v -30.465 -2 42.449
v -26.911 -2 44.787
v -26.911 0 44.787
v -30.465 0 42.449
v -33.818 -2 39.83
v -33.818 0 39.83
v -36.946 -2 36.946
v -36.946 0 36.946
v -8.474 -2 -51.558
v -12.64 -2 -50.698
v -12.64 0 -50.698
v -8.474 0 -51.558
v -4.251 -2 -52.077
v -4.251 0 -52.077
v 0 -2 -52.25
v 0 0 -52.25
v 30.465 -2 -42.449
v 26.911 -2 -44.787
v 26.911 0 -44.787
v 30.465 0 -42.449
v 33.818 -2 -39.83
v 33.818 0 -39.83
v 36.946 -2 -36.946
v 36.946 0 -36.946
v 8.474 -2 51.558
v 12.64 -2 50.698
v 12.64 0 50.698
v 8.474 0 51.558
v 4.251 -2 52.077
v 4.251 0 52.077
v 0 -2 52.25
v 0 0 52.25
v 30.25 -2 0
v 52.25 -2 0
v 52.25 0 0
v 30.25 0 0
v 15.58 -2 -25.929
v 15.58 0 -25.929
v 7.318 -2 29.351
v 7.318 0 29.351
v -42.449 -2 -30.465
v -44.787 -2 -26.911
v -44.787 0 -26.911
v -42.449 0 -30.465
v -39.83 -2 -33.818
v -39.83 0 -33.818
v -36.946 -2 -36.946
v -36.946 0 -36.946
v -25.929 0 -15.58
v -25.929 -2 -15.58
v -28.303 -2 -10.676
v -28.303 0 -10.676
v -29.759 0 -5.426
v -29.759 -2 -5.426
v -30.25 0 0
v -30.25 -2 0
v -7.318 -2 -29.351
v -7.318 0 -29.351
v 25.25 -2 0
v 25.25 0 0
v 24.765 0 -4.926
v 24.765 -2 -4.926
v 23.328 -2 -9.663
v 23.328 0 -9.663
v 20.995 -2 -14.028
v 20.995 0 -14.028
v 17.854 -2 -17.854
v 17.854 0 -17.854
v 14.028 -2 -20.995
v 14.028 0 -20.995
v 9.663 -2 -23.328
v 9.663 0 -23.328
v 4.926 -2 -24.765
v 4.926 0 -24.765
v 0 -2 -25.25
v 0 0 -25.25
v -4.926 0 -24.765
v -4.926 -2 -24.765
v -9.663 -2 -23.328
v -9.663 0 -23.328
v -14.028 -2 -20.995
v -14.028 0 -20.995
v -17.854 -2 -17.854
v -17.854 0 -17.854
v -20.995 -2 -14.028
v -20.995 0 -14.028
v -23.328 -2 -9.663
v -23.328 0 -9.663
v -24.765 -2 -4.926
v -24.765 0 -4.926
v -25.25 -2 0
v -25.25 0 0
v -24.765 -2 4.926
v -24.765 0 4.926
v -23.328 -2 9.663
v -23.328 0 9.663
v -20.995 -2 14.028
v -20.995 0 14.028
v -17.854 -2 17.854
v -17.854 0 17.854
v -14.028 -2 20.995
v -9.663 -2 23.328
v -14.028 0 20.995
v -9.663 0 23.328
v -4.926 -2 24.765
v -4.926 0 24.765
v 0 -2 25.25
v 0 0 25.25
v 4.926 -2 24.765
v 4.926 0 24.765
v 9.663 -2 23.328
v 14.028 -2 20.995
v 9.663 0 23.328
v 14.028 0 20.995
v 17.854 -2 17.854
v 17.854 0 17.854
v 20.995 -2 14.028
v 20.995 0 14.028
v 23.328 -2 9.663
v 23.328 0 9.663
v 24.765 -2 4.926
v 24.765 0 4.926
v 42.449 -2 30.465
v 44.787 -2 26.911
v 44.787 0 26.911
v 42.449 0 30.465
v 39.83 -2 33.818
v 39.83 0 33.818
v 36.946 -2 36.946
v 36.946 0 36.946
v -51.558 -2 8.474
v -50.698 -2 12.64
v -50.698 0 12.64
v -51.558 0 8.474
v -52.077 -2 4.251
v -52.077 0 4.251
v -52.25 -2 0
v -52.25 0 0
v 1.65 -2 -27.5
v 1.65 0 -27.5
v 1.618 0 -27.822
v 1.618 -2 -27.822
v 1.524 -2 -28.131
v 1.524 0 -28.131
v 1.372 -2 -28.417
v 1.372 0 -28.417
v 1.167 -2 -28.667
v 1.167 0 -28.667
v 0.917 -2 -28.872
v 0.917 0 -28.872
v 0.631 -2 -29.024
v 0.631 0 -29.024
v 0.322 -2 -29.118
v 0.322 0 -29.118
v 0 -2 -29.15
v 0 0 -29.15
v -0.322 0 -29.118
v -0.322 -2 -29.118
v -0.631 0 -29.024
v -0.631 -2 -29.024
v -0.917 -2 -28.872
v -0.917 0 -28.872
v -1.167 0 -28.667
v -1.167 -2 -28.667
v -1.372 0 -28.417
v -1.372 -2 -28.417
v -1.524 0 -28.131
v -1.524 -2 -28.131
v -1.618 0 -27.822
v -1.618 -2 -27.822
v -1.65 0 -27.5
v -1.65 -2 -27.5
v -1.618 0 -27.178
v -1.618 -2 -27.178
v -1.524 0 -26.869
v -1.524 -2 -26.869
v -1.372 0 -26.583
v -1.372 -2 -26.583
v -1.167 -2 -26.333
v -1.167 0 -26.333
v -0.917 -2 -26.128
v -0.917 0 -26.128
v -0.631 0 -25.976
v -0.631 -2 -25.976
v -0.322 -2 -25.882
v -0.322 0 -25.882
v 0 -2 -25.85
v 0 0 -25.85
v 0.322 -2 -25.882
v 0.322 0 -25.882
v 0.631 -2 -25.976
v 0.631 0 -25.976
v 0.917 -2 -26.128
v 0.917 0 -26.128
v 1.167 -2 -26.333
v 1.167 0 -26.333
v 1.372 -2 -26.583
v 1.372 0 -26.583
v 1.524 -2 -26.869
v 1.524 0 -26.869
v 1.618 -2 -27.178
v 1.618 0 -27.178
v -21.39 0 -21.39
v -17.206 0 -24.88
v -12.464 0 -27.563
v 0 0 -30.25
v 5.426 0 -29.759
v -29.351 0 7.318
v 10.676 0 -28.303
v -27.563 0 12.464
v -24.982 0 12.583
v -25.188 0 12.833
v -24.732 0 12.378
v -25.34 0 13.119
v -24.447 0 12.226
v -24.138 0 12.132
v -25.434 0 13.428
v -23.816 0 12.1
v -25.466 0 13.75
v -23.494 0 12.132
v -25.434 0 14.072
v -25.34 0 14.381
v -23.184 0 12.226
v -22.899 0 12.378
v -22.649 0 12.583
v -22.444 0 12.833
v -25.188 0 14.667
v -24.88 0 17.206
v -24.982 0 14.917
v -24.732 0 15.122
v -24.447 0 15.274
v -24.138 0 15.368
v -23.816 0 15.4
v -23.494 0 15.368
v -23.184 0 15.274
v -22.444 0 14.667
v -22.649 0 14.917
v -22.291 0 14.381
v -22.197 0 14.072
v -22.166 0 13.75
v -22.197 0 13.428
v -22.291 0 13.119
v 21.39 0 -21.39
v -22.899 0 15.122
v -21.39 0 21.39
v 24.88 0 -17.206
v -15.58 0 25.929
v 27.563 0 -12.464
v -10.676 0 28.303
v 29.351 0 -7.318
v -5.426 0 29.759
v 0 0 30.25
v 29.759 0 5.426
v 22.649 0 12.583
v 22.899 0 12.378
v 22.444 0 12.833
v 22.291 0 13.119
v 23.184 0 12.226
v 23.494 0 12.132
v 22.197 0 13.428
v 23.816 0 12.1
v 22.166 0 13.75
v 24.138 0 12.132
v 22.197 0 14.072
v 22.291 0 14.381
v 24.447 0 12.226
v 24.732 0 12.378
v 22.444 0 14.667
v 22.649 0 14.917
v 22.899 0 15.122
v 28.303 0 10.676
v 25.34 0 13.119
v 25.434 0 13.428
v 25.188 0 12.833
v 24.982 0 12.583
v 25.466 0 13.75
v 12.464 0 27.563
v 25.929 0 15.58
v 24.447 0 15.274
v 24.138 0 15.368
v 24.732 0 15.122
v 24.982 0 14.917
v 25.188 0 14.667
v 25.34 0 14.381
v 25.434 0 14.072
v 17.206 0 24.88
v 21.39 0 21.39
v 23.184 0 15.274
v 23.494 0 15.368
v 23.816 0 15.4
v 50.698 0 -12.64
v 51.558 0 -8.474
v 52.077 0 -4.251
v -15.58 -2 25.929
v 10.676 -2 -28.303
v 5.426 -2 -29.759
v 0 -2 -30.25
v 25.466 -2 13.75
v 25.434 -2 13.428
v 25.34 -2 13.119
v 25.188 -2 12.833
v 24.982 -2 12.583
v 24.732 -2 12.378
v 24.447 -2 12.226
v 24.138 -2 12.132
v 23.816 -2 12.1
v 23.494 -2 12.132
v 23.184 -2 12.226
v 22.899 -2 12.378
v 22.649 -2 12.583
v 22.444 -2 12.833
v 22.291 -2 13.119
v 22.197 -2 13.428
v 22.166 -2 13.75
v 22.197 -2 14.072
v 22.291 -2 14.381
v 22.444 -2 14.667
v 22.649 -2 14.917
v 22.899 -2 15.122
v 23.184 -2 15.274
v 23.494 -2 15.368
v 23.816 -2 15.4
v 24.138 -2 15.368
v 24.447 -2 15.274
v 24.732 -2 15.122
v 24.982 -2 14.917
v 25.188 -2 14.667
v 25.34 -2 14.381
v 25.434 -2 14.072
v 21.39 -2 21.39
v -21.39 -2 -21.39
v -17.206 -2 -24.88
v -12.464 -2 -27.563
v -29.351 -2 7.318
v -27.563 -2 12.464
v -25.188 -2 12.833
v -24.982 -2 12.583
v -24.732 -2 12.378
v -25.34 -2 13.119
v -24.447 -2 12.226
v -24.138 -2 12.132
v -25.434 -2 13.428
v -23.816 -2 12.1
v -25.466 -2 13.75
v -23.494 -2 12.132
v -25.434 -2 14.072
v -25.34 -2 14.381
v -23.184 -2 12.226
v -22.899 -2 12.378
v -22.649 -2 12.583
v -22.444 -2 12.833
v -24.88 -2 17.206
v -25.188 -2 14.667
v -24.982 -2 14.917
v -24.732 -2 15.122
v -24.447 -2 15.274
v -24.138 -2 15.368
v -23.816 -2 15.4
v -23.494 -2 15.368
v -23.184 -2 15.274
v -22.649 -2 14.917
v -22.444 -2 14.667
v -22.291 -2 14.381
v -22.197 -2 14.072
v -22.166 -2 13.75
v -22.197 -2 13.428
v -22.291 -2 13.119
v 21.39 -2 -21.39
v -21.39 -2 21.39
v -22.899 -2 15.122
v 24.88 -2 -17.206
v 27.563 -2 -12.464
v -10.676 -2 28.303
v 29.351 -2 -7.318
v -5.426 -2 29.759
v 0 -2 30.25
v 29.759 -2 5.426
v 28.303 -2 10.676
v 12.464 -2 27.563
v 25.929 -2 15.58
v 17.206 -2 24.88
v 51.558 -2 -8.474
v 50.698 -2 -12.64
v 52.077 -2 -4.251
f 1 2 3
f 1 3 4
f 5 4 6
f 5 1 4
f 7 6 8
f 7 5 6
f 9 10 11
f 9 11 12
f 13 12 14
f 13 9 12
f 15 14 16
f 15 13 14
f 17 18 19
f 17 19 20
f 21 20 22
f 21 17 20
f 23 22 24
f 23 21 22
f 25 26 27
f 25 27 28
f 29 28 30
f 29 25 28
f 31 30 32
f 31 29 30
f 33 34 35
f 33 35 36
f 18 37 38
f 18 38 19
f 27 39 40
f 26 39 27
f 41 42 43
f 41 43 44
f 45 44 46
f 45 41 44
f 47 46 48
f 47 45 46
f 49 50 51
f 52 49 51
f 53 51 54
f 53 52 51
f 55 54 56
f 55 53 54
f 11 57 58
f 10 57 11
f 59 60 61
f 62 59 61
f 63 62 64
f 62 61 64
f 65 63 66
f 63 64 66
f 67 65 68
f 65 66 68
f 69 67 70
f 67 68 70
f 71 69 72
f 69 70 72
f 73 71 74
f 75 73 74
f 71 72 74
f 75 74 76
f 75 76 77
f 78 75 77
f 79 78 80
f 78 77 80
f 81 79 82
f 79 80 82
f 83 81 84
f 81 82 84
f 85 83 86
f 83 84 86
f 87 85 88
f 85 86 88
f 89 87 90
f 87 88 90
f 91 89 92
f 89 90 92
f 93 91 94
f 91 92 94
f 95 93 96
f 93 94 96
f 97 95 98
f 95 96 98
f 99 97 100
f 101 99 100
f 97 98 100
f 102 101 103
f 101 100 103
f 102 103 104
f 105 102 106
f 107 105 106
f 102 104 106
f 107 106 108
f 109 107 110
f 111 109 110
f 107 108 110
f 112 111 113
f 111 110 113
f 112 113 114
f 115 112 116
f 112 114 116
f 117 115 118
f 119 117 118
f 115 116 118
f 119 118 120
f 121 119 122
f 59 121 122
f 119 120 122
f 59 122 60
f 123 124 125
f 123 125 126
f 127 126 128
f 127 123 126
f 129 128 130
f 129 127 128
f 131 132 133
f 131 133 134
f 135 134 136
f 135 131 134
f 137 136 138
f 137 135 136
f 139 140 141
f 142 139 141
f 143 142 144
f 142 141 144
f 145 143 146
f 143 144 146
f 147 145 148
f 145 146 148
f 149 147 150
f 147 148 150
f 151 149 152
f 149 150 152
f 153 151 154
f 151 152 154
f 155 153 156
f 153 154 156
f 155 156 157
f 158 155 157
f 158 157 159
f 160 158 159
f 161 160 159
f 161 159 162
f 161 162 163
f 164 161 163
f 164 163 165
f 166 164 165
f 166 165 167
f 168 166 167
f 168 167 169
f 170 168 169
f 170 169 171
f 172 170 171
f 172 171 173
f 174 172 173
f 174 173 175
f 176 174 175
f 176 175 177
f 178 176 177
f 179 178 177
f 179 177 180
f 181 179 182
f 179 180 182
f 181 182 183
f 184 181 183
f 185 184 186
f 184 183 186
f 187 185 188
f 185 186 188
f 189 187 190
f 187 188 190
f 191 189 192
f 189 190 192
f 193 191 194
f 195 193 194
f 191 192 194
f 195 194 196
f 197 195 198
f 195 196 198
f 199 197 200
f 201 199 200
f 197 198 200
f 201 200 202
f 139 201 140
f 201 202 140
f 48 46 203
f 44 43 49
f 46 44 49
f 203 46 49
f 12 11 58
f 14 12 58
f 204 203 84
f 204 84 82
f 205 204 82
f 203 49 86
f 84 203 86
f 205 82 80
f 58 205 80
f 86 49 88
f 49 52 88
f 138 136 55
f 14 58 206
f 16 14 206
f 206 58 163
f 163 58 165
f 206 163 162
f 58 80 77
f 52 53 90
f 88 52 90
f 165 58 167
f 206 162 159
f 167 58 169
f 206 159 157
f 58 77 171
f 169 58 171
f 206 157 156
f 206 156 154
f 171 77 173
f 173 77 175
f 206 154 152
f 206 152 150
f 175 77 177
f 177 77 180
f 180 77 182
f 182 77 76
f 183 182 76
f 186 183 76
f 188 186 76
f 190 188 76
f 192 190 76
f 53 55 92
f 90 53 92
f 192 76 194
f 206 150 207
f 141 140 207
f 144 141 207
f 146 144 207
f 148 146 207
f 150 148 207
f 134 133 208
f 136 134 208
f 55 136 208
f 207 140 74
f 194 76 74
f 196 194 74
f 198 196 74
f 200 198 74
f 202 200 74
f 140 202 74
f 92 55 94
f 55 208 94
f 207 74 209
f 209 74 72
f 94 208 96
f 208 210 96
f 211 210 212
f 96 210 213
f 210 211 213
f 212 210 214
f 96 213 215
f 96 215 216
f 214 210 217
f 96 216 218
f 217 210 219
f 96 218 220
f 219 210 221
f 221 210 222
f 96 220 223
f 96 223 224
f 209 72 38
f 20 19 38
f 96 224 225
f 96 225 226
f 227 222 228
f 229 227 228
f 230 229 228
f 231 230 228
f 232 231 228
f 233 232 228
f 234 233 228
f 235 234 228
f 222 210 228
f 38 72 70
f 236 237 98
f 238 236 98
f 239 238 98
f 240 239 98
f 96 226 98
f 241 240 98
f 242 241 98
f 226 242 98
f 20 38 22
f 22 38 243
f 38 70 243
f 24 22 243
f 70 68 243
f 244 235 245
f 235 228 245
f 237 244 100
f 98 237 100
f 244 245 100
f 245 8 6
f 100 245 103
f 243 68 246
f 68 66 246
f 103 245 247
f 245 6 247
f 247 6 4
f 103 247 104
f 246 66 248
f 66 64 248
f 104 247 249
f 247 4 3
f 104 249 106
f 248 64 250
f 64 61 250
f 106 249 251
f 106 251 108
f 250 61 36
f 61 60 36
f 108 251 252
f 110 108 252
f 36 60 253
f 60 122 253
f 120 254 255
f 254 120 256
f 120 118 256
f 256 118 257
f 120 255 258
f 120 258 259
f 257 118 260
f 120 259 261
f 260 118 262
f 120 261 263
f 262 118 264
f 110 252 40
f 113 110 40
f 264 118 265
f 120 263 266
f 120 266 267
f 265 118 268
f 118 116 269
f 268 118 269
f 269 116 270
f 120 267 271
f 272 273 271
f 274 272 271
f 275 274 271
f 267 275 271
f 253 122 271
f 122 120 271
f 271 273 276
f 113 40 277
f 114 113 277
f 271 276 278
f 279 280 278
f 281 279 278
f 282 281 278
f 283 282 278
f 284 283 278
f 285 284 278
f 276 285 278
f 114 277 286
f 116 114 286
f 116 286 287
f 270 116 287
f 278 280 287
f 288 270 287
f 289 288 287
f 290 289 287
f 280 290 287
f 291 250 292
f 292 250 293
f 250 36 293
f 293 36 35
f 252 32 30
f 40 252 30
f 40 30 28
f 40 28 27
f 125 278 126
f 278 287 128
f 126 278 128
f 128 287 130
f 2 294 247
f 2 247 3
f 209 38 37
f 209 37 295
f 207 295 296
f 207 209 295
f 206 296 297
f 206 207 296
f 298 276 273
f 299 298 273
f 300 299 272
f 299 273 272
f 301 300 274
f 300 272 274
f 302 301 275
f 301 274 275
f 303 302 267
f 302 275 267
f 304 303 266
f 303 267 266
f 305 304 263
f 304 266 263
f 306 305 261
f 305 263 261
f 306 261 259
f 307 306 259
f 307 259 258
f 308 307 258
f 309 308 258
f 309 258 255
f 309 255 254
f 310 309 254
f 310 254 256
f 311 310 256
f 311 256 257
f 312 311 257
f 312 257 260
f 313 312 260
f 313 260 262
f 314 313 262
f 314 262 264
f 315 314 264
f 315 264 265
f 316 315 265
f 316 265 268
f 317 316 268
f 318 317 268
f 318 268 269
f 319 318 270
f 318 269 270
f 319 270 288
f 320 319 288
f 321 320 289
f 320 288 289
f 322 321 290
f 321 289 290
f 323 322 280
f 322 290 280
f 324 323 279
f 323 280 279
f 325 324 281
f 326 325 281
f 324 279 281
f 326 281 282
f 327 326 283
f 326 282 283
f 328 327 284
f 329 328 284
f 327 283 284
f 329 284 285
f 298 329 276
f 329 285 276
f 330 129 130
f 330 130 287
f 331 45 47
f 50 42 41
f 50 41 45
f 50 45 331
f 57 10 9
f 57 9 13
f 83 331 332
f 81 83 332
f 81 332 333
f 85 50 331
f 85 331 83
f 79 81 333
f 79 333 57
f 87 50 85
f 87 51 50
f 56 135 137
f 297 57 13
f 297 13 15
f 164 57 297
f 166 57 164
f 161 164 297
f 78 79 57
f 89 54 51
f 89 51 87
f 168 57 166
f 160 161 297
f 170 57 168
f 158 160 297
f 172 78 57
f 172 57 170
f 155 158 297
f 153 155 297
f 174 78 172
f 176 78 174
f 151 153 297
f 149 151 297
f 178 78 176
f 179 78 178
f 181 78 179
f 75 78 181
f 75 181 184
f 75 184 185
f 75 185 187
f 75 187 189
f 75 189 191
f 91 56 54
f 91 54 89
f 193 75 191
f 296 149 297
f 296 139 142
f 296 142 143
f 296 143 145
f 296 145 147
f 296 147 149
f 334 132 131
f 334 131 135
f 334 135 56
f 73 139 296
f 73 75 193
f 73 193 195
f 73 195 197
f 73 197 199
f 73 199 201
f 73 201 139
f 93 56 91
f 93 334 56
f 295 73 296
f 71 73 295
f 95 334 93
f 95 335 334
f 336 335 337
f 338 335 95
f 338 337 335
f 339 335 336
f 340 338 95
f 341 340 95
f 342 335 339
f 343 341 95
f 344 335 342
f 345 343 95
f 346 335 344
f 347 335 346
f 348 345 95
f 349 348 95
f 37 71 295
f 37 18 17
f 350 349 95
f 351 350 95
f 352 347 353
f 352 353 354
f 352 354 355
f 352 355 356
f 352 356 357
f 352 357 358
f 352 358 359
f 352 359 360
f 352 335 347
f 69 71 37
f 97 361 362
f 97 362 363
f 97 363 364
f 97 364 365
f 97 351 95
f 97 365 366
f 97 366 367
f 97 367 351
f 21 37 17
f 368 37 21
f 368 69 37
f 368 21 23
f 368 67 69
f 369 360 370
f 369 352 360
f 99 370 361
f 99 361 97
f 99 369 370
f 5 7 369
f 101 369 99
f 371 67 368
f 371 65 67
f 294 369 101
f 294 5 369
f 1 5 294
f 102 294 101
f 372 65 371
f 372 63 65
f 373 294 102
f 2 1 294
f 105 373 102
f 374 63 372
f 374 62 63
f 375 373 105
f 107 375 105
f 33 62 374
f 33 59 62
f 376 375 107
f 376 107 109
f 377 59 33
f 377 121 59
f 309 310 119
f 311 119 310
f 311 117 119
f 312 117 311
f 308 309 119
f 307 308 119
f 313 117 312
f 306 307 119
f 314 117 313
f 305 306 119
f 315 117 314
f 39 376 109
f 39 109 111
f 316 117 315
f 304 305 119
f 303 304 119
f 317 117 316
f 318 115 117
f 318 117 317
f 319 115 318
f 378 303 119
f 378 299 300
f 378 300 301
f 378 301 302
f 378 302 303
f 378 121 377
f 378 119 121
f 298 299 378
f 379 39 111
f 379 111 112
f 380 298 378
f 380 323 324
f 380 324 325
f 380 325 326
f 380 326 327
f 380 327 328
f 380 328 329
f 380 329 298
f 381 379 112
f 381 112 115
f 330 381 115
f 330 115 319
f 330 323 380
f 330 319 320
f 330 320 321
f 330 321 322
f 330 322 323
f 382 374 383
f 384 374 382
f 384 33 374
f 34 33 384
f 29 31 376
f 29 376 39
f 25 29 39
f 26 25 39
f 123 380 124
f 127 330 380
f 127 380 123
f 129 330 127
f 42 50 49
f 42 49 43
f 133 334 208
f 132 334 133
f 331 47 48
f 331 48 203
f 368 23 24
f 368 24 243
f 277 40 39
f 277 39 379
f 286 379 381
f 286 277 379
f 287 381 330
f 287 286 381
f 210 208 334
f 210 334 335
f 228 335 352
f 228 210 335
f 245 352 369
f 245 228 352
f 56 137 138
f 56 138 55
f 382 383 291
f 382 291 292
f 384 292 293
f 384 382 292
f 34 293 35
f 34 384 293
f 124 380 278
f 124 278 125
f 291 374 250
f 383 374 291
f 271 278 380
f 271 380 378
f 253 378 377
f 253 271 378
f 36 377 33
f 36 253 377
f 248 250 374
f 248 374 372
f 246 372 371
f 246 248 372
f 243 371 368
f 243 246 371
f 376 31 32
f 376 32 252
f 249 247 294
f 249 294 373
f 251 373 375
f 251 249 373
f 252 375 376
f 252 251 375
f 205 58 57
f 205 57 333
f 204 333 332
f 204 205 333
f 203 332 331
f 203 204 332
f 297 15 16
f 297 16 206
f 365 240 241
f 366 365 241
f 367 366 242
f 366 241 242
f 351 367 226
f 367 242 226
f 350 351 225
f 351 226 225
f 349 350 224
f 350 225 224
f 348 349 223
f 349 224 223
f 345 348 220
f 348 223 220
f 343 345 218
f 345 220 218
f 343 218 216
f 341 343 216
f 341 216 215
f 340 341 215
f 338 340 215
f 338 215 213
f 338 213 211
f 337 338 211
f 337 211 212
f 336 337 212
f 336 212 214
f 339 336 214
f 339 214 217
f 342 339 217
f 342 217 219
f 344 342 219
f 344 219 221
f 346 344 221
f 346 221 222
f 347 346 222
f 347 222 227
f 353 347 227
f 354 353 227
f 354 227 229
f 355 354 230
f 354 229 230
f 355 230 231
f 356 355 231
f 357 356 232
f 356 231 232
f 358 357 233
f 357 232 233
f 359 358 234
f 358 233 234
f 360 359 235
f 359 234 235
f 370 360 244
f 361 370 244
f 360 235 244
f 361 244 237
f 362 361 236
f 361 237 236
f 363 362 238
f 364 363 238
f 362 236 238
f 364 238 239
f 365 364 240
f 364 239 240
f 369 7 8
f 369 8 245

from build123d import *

# Parameters (mm, degrees)
SKETCH1_R           = 30.25
SKETCH1_R_2         = 25.25
EXTRUDE_THIN1_DEPTH = 2
SKETCH2_R           = 1.65
CUT_EXTRUDE3_DEPTH  = 10
BOSS_EXTRUDE1_DEPTH = 2


with BuildPart() as part:
    # Sketch1 → Extrude-Thin1 (new body)
    with BuildSketch(Plane(origin=(0, 0, 0), x_dir=(1, 0, 0), z_dir=(0, 1, 0))):
        Circle(SKETCH1_R)
        Circle(SKETCH1_R_2, mode=Mode.SUBTRACT)
    extrude(amount=-EXTRUDE_THIN1_DEPTH)

    # Sketch2 → Cut-Extrude3 (cut)
    with BuildSketch(Plane(origin=(0, 0, 0), x_dir=(1, 0, 0), z_dir=(0, 1, 0))):
        with Locations((0, 27.5)):
            Circle(SKETCH2_R)
        with Locations((23.815698604, -13.75)):
            Circle(SKETCH2_R)
        with Locations((-23.815698604, -13.75)):
            Circle(SKETCH2_R)
    extrude(amount=-CUT_EXTRUDE3_DEPTH, mode=Mode.SUBTRACT)

    # Sketch5 → Boss-Extrude1 (add)
    with BuildSketch(Plane.XZ.offset(2)):
        with BuildLine():
            Line((0, 52.25), (0, 30.25))
            ThreePointArc((0, 30.25), (3.686547638, 30.024521087), (7.318137342, 29.35144572))
            Line((7.318137342, 29.35144572), (12.640419045, 50.697951698))
            ThreePointArc((12.640419045, 50.697951698), (6.367673193, 51.860536423), (0, 52.25))
        make_face()
        with BuildLine():
            Line((36.946329317, 36.946329317), (21.389980131, 21.389980131))
            ThreePointArc((21.389980131, 21.389980131), (23.837325297, 18.623759629), (25.929310846, 15.579901766))
            Line((25.929310846, 15.579901766), (44.786991462, 26.910739414))
            ThreePointArc((44.786991462, 26.910739414), (41.173561876, 32.168312086), (36.946329317, 36.946329317))
        make_face()
        with BuildLine():
            Line((52.25, 0), (30.25, 0))
            ThreePointArc((30.25, 0), (30.024521087, -3.686547638), (29.35144572, -7.318137342))
            Line((29.35144572, -7.318137342), (50.697951698, -12.640419045))
            ThreePointArc((50.697951698, -12.640419045), (51.860536423, -6.367673193), (52.25, 0))
        make_face()
        with BuildLine():
            Line((36.946329317, -36.946329317), (21.389980131, -21.389980131))
            ThreePointArc((21.389980131, -21.389980131), (18.623759629, -23.837325297), (15.579901766, -25.929310846))
            Line((15.579901766, -25.929310846), (26.910739414, -44.786991462))
            ThreePointArc((26.910739414, -44.786991462), (32.168312086, -41.173561876), (36.946329317, -36.946329317))
        make_face()
        with BuildLine():
            Line((0, -52.25), (0, -30.25))
            ThreePointArc((0, -30.25), (-3.686547638, -30.024521087), (-7.318137342, -29.35144572))
            Line((-7.318137342, -29.35144572), (-12.640419045, -50.697951698))
            ThreePointArc((-12.640419045, -50.697951698), (-6.367673193, -51.860536423), (0, -52.25))
        make_face()
        with BuildLine():
            Line((-36.946329317, -36.946329317), (-21.389980131, -21.389980131))
            ThreePointArc((-21.389980131, -21.389980131), (-23.837325297, -18.623759629), (-25.929310846, -15.579901766))
            Line((-25.929310846, -15.579901766), (-44.786991462, -26.910739414))
            ThreePointArc((-44.786991462, -26.910739414), (-41.173561876, -32.168312086), (-36.946329317, -36.946329317))
        make_face()
        with BuildLine():
            Line((-52.25, 0), (-30.25, 0))
            ThreePointArc((-30.25, 0), (-30.024521087, 3.686547638), (-29.35144572, 7.318137342))
            Line((-29.35144572, 7.318137342), (-50.697951698, 12.640419045))
            ThreePointArc((-50.697951698, 12.640419045), (-51.860536423, 6.367673193), (-52.25, 0))
        make_face()
        with BuildLine():
            Line((-36.946329317, 36.946329317), (-21.389980131, 21.389980131))
            ThreePointArc((-21.389980131, 21.389980131), (-18.623759629, 23.837325297), (-15.579901766, 25.929310846))
            Line((-15.579901766, 25.929310846), (-26.910739414, 44.786991462))
            ThreePointArc((-26.910739414, 44.786991462), (-32.168312086, 41.173561876), (-36.946329317, 36.946329317))
        make_face()
    extrude(amount=-BOSS_EXTRUDE1_DEPTH)


solid = part.part
